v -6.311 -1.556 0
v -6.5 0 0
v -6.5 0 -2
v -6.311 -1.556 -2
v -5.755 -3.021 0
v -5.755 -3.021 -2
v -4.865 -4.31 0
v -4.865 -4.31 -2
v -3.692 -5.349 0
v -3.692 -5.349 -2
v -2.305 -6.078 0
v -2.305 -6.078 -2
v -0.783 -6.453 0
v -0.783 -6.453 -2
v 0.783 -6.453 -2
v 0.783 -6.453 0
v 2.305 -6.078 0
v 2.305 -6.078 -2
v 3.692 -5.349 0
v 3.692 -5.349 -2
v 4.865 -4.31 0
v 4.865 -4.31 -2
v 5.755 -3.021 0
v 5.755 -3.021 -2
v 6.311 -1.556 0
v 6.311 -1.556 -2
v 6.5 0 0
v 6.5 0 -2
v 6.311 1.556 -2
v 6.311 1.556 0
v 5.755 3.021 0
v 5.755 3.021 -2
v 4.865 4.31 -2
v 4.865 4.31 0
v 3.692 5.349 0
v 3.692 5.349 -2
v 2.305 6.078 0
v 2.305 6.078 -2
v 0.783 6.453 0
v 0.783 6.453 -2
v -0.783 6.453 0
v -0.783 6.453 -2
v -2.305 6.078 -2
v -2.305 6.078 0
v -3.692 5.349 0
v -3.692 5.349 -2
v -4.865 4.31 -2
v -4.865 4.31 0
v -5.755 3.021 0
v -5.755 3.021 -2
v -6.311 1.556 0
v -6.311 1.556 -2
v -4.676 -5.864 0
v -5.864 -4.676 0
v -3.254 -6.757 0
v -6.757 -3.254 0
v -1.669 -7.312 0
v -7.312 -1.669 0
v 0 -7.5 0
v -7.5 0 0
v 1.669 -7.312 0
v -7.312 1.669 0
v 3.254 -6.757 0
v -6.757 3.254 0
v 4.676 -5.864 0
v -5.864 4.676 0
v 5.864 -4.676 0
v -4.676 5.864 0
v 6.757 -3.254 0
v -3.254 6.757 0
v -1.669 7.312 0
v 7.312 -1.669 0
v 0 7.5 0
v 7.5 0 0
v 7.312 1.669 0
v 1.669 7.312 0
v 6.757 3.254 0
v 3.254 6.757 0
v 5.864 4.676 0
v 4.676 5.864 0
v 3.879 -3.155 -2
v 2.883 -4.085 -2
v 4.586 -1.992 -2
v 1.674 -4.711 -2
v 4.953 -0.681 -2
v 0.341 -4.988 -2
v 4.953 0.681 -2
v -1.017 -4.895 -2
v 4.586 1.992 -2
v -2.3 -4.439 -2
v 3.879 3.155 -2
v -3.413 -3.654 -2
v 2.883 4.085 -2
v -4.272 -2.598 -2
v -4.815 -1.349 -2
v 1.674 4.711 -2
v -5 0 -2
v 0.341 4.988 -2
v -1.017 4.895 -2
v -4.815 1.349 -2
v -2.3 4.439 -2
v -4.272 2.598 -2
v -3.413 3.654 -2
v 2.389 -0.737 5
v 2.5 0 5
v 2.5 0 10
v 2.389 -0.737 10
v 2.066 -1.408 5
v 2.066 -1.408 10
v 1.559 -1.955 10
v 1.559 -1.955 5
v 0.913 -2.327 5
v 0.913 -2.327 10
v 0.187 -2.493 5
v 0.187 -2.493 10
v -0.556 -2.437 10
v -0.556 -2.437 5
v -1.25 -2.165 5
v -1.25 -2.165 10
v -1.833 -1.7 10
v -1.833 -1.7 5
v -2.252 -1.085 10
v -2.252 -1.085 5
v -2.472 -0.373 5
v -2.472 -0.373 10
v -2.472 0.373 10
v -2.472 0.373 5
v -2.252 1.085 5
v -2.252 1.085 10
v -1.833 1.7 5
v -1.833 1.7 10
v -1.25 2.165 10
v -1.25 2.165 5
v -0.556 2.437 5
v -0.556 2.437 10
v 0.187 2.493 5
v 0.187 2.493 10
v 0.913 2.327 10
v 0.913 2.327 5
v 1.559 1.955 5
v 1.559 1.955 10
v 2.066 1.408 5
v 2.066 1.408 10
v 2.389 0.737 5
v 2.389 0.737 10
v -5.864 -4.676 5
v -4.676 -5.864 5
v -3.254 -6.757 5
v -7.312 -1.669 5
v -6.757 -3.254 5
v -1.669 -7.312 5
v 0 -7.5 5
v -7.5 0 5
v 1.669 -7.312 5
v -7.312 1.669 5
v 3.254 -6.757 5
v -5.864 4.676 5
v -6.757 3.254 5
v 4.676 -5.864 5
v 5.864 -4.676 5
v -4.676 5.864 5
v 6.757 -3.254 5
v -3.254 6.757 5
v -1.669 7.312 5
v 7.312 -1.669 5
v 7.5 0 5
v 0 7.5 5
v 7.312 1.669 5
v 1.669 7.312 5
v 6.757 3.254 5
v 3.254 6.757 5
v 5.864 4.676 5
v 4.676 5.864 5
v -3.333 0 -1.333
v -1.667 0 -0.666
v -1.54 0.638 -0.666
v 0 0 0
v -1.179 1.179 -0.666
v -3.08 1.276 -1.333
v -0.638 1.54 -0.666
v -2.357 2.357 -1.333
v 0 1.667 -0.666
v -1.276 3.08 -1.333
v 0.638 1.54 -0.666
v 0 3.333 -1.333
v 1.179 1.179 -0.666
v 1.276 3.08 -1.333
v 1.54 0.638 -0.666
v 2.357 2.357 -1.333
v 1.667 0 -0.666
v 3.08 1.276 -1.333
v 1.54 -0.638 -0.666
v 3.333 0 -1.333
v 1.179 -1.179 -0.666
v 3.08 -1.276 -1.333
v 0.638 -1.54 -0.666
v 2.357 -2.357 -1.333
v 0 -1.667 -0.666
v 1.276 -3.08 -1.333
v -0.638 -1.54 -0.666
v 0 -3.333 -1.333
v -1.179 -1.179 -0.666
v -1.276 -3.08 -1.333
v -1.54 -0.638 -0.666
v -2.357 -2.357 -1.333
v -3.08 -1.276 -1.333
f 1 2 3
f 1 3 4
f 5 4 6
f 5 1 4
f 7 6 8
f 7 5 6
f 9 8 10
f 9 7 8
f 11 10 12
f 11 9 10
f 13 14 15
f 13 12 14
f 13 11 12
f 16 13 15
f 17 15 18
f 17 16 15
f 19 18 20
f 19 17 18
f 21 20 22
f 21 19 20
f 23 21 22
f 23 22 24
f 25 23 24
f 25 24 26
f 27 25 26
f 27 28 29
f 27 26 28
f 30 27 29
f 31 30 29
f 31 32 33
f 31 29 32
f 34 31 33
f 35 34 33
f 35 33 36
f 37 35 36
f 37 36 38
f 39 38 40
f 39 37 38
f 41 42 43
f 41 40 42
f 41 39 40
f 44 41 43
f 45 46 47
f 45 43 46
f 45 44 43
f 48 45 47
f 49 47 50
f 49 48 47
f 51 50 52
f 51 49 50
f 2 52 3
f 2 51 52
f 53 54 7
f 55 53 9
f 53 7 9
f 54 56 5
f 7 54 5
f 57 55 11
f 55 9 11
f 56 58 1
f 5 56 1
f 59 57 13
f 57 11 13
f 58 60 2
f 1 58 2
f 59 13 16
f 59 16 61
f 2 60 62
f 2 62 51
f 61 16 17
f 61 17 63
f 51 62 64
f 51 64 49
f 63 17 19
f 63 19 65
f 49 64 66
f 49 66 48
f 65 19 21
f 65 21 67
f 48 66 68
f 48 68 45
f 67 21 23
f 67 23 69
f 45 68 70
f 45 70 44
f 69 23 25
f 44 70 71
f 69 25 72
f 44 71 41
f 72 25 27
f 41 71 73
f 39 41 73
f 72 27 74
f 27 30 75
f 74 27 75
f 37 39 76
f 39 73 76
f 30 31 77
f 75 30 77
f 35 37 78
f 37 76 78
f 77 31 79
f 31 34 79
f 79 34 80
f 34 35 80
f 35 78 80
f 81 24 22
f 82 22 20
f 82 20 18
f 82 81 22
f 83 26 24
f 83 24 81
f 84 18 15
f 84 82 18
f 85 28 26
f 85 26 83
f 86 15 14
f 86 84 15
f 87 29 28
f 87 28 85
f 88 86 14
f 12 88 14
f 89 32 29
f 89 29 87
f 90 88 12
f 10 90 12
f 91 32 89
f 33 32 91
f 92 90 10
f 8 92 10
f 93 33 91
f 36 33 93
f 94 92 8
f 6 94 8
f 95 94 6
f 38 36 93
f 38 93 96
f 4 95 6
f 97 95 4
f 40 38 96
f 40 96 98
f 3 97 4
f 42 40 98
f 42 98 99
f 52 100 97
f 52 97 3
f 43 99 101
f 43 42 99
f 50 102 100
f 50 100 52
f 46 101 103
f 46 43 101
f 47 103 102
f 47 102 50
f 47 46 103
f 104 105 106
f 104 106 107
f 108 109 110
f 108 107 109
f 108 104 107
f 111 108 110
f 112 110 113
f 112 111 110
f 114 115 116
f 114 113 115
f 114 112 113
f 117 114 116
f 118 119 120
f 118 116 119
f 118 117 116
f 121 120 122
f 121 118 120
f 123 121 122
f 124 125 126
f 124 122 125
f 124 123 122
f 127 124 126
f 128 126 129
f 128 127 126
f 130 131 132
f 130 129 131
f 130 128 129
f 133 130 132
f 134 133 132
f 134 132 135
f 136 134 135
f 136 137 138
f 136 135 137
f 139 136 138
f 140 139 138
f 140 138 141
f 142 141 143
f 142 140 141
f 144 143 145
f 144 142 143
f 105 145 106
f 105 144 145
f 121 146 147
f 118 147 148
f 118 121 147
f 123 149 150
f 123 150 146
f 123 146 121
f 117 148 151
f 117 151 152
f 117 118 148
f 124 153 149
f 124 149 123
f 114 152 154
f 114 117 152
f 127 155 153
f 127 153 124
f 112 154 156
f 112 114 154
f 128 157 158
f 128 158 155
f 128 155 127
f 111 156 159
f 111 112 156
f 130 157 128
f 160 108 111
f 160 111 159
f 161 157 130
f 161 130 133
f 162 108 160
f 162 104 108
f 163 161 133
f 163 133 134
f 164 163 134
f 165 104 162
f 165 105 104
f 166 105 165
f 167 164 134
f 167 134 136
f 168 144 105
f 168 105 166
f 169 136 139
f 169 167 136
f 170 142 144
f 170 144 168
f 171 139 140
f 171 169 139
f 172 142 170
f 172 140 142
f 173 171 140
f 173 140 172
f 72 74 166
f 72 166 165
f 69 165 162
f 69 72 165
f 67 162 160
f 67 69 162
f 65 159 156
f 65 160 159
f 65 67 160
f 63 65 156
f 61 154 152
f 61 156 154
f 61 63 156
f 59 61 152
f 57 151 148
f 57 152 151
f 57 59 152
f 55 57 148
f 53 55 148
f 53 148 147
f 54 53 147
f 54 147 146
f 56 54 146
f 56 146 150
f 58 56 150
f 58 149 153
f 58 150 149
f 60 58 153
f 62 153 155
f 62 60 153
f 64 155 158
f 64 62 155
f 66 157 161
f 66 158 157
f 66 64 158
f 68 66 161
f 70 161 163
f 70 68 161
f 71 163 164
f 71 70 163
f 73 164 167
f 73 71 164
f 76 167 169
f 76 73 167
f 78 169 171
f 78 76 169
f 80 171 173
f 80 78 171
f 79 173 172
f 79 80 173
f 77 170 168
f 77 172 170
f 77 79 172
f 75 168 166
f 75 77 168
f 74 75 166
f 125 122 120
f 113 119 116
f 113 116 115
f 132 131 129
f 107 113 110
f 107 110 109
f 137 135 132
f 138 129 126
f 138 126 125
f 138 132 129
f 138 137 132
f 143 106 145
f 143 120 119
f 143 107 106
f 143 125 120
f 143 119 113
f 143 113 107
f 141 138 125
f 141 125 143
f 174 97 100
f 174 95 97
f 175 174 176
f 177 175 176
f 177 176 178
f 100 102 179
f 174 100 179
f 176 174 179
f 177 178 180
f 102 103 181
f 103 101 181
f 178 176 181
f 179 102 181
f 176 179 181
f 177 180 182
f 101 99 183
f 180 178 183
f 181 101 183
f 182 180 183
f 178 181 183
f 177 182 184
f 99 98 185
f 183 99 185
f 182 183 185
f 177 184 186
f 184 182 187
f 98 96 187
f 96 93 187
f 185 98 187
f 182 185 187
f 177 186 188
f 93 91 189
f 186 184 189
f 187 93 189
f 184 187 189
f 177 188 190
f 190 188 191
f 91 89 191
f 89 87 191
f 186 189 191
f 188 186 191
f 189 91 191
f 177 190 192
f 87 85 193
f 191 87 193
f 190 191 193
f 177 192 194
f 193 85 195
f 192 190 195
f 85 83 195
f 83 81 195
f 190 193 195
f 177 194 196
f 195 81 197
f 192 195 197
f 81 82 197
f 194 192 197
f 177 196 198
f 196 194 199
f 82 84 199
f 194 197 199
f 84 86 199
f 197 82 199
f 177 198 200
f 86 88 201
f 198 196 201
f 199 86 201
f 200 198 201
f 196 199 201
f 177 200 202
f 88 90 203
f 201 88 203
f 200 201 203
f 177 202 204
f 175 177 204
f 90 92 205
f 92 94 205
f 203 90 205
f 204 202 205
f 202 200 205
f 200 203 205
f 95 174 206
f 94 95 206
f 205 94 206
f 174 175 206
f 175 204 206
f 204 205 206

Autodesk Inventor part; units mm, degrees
ref_plane "YZ Plane" through (0, 0, 0) normal (1, 0, 0) x (0, 1, 0)
ref_plane "XZ Plane" through (0, 0, 0) normal (0, 1, 0) x (-1, 0, 0)
ref_plane "XY Plane" through (0, 0, 0) normal (0, 0, 1) x (1, 0, 0)
sketch "Sketch1" plane through (0, 0, 0) normal (0, 0, 1) x (1, 0, 0)
  circle A0 centre (0, 0) radius 7.5
  dimension "d0" = 15
extrude "Extrusion1" add sketch "Sketch1" along normal blind 5
sketch "Sketch2" plane through (0, 0, 0) normal (0, 0, -1) x (-1, 0, 0)
  circle A0 centre (0, 0) radius 6.5
  circle A1 centre (0, 0) radius 5
  circle A2 centre (0, 0) radius 7.5 projected
  dimension "d3" = 13
  dimension "d4" = 15
  dimension "d5" = 10
extrude "Extrusion2" add sketch "Sketch2" along normal blind 2 contours A0
sketch "Sketch3" plane through (0, 0, 5) normal (0, 0, 1) x (1, 0, 0)
  circle A0 centre (0, 0) radius 7.5 projected
  circle A1 centre (0, 0) radius 2.5
  dimension "d8" = 15
  dimension "d13" = 5
extrude "Extrusion3" add sketch "Sketch3" along normal blind 5 contours A1
chamfer "Chamfer1" distance 2 angle 68.199 1 edges at (5, 0, 0) measured on face at (-4.9838, -0.4023, -1.3333)
properties part number "stredne_koleso"
